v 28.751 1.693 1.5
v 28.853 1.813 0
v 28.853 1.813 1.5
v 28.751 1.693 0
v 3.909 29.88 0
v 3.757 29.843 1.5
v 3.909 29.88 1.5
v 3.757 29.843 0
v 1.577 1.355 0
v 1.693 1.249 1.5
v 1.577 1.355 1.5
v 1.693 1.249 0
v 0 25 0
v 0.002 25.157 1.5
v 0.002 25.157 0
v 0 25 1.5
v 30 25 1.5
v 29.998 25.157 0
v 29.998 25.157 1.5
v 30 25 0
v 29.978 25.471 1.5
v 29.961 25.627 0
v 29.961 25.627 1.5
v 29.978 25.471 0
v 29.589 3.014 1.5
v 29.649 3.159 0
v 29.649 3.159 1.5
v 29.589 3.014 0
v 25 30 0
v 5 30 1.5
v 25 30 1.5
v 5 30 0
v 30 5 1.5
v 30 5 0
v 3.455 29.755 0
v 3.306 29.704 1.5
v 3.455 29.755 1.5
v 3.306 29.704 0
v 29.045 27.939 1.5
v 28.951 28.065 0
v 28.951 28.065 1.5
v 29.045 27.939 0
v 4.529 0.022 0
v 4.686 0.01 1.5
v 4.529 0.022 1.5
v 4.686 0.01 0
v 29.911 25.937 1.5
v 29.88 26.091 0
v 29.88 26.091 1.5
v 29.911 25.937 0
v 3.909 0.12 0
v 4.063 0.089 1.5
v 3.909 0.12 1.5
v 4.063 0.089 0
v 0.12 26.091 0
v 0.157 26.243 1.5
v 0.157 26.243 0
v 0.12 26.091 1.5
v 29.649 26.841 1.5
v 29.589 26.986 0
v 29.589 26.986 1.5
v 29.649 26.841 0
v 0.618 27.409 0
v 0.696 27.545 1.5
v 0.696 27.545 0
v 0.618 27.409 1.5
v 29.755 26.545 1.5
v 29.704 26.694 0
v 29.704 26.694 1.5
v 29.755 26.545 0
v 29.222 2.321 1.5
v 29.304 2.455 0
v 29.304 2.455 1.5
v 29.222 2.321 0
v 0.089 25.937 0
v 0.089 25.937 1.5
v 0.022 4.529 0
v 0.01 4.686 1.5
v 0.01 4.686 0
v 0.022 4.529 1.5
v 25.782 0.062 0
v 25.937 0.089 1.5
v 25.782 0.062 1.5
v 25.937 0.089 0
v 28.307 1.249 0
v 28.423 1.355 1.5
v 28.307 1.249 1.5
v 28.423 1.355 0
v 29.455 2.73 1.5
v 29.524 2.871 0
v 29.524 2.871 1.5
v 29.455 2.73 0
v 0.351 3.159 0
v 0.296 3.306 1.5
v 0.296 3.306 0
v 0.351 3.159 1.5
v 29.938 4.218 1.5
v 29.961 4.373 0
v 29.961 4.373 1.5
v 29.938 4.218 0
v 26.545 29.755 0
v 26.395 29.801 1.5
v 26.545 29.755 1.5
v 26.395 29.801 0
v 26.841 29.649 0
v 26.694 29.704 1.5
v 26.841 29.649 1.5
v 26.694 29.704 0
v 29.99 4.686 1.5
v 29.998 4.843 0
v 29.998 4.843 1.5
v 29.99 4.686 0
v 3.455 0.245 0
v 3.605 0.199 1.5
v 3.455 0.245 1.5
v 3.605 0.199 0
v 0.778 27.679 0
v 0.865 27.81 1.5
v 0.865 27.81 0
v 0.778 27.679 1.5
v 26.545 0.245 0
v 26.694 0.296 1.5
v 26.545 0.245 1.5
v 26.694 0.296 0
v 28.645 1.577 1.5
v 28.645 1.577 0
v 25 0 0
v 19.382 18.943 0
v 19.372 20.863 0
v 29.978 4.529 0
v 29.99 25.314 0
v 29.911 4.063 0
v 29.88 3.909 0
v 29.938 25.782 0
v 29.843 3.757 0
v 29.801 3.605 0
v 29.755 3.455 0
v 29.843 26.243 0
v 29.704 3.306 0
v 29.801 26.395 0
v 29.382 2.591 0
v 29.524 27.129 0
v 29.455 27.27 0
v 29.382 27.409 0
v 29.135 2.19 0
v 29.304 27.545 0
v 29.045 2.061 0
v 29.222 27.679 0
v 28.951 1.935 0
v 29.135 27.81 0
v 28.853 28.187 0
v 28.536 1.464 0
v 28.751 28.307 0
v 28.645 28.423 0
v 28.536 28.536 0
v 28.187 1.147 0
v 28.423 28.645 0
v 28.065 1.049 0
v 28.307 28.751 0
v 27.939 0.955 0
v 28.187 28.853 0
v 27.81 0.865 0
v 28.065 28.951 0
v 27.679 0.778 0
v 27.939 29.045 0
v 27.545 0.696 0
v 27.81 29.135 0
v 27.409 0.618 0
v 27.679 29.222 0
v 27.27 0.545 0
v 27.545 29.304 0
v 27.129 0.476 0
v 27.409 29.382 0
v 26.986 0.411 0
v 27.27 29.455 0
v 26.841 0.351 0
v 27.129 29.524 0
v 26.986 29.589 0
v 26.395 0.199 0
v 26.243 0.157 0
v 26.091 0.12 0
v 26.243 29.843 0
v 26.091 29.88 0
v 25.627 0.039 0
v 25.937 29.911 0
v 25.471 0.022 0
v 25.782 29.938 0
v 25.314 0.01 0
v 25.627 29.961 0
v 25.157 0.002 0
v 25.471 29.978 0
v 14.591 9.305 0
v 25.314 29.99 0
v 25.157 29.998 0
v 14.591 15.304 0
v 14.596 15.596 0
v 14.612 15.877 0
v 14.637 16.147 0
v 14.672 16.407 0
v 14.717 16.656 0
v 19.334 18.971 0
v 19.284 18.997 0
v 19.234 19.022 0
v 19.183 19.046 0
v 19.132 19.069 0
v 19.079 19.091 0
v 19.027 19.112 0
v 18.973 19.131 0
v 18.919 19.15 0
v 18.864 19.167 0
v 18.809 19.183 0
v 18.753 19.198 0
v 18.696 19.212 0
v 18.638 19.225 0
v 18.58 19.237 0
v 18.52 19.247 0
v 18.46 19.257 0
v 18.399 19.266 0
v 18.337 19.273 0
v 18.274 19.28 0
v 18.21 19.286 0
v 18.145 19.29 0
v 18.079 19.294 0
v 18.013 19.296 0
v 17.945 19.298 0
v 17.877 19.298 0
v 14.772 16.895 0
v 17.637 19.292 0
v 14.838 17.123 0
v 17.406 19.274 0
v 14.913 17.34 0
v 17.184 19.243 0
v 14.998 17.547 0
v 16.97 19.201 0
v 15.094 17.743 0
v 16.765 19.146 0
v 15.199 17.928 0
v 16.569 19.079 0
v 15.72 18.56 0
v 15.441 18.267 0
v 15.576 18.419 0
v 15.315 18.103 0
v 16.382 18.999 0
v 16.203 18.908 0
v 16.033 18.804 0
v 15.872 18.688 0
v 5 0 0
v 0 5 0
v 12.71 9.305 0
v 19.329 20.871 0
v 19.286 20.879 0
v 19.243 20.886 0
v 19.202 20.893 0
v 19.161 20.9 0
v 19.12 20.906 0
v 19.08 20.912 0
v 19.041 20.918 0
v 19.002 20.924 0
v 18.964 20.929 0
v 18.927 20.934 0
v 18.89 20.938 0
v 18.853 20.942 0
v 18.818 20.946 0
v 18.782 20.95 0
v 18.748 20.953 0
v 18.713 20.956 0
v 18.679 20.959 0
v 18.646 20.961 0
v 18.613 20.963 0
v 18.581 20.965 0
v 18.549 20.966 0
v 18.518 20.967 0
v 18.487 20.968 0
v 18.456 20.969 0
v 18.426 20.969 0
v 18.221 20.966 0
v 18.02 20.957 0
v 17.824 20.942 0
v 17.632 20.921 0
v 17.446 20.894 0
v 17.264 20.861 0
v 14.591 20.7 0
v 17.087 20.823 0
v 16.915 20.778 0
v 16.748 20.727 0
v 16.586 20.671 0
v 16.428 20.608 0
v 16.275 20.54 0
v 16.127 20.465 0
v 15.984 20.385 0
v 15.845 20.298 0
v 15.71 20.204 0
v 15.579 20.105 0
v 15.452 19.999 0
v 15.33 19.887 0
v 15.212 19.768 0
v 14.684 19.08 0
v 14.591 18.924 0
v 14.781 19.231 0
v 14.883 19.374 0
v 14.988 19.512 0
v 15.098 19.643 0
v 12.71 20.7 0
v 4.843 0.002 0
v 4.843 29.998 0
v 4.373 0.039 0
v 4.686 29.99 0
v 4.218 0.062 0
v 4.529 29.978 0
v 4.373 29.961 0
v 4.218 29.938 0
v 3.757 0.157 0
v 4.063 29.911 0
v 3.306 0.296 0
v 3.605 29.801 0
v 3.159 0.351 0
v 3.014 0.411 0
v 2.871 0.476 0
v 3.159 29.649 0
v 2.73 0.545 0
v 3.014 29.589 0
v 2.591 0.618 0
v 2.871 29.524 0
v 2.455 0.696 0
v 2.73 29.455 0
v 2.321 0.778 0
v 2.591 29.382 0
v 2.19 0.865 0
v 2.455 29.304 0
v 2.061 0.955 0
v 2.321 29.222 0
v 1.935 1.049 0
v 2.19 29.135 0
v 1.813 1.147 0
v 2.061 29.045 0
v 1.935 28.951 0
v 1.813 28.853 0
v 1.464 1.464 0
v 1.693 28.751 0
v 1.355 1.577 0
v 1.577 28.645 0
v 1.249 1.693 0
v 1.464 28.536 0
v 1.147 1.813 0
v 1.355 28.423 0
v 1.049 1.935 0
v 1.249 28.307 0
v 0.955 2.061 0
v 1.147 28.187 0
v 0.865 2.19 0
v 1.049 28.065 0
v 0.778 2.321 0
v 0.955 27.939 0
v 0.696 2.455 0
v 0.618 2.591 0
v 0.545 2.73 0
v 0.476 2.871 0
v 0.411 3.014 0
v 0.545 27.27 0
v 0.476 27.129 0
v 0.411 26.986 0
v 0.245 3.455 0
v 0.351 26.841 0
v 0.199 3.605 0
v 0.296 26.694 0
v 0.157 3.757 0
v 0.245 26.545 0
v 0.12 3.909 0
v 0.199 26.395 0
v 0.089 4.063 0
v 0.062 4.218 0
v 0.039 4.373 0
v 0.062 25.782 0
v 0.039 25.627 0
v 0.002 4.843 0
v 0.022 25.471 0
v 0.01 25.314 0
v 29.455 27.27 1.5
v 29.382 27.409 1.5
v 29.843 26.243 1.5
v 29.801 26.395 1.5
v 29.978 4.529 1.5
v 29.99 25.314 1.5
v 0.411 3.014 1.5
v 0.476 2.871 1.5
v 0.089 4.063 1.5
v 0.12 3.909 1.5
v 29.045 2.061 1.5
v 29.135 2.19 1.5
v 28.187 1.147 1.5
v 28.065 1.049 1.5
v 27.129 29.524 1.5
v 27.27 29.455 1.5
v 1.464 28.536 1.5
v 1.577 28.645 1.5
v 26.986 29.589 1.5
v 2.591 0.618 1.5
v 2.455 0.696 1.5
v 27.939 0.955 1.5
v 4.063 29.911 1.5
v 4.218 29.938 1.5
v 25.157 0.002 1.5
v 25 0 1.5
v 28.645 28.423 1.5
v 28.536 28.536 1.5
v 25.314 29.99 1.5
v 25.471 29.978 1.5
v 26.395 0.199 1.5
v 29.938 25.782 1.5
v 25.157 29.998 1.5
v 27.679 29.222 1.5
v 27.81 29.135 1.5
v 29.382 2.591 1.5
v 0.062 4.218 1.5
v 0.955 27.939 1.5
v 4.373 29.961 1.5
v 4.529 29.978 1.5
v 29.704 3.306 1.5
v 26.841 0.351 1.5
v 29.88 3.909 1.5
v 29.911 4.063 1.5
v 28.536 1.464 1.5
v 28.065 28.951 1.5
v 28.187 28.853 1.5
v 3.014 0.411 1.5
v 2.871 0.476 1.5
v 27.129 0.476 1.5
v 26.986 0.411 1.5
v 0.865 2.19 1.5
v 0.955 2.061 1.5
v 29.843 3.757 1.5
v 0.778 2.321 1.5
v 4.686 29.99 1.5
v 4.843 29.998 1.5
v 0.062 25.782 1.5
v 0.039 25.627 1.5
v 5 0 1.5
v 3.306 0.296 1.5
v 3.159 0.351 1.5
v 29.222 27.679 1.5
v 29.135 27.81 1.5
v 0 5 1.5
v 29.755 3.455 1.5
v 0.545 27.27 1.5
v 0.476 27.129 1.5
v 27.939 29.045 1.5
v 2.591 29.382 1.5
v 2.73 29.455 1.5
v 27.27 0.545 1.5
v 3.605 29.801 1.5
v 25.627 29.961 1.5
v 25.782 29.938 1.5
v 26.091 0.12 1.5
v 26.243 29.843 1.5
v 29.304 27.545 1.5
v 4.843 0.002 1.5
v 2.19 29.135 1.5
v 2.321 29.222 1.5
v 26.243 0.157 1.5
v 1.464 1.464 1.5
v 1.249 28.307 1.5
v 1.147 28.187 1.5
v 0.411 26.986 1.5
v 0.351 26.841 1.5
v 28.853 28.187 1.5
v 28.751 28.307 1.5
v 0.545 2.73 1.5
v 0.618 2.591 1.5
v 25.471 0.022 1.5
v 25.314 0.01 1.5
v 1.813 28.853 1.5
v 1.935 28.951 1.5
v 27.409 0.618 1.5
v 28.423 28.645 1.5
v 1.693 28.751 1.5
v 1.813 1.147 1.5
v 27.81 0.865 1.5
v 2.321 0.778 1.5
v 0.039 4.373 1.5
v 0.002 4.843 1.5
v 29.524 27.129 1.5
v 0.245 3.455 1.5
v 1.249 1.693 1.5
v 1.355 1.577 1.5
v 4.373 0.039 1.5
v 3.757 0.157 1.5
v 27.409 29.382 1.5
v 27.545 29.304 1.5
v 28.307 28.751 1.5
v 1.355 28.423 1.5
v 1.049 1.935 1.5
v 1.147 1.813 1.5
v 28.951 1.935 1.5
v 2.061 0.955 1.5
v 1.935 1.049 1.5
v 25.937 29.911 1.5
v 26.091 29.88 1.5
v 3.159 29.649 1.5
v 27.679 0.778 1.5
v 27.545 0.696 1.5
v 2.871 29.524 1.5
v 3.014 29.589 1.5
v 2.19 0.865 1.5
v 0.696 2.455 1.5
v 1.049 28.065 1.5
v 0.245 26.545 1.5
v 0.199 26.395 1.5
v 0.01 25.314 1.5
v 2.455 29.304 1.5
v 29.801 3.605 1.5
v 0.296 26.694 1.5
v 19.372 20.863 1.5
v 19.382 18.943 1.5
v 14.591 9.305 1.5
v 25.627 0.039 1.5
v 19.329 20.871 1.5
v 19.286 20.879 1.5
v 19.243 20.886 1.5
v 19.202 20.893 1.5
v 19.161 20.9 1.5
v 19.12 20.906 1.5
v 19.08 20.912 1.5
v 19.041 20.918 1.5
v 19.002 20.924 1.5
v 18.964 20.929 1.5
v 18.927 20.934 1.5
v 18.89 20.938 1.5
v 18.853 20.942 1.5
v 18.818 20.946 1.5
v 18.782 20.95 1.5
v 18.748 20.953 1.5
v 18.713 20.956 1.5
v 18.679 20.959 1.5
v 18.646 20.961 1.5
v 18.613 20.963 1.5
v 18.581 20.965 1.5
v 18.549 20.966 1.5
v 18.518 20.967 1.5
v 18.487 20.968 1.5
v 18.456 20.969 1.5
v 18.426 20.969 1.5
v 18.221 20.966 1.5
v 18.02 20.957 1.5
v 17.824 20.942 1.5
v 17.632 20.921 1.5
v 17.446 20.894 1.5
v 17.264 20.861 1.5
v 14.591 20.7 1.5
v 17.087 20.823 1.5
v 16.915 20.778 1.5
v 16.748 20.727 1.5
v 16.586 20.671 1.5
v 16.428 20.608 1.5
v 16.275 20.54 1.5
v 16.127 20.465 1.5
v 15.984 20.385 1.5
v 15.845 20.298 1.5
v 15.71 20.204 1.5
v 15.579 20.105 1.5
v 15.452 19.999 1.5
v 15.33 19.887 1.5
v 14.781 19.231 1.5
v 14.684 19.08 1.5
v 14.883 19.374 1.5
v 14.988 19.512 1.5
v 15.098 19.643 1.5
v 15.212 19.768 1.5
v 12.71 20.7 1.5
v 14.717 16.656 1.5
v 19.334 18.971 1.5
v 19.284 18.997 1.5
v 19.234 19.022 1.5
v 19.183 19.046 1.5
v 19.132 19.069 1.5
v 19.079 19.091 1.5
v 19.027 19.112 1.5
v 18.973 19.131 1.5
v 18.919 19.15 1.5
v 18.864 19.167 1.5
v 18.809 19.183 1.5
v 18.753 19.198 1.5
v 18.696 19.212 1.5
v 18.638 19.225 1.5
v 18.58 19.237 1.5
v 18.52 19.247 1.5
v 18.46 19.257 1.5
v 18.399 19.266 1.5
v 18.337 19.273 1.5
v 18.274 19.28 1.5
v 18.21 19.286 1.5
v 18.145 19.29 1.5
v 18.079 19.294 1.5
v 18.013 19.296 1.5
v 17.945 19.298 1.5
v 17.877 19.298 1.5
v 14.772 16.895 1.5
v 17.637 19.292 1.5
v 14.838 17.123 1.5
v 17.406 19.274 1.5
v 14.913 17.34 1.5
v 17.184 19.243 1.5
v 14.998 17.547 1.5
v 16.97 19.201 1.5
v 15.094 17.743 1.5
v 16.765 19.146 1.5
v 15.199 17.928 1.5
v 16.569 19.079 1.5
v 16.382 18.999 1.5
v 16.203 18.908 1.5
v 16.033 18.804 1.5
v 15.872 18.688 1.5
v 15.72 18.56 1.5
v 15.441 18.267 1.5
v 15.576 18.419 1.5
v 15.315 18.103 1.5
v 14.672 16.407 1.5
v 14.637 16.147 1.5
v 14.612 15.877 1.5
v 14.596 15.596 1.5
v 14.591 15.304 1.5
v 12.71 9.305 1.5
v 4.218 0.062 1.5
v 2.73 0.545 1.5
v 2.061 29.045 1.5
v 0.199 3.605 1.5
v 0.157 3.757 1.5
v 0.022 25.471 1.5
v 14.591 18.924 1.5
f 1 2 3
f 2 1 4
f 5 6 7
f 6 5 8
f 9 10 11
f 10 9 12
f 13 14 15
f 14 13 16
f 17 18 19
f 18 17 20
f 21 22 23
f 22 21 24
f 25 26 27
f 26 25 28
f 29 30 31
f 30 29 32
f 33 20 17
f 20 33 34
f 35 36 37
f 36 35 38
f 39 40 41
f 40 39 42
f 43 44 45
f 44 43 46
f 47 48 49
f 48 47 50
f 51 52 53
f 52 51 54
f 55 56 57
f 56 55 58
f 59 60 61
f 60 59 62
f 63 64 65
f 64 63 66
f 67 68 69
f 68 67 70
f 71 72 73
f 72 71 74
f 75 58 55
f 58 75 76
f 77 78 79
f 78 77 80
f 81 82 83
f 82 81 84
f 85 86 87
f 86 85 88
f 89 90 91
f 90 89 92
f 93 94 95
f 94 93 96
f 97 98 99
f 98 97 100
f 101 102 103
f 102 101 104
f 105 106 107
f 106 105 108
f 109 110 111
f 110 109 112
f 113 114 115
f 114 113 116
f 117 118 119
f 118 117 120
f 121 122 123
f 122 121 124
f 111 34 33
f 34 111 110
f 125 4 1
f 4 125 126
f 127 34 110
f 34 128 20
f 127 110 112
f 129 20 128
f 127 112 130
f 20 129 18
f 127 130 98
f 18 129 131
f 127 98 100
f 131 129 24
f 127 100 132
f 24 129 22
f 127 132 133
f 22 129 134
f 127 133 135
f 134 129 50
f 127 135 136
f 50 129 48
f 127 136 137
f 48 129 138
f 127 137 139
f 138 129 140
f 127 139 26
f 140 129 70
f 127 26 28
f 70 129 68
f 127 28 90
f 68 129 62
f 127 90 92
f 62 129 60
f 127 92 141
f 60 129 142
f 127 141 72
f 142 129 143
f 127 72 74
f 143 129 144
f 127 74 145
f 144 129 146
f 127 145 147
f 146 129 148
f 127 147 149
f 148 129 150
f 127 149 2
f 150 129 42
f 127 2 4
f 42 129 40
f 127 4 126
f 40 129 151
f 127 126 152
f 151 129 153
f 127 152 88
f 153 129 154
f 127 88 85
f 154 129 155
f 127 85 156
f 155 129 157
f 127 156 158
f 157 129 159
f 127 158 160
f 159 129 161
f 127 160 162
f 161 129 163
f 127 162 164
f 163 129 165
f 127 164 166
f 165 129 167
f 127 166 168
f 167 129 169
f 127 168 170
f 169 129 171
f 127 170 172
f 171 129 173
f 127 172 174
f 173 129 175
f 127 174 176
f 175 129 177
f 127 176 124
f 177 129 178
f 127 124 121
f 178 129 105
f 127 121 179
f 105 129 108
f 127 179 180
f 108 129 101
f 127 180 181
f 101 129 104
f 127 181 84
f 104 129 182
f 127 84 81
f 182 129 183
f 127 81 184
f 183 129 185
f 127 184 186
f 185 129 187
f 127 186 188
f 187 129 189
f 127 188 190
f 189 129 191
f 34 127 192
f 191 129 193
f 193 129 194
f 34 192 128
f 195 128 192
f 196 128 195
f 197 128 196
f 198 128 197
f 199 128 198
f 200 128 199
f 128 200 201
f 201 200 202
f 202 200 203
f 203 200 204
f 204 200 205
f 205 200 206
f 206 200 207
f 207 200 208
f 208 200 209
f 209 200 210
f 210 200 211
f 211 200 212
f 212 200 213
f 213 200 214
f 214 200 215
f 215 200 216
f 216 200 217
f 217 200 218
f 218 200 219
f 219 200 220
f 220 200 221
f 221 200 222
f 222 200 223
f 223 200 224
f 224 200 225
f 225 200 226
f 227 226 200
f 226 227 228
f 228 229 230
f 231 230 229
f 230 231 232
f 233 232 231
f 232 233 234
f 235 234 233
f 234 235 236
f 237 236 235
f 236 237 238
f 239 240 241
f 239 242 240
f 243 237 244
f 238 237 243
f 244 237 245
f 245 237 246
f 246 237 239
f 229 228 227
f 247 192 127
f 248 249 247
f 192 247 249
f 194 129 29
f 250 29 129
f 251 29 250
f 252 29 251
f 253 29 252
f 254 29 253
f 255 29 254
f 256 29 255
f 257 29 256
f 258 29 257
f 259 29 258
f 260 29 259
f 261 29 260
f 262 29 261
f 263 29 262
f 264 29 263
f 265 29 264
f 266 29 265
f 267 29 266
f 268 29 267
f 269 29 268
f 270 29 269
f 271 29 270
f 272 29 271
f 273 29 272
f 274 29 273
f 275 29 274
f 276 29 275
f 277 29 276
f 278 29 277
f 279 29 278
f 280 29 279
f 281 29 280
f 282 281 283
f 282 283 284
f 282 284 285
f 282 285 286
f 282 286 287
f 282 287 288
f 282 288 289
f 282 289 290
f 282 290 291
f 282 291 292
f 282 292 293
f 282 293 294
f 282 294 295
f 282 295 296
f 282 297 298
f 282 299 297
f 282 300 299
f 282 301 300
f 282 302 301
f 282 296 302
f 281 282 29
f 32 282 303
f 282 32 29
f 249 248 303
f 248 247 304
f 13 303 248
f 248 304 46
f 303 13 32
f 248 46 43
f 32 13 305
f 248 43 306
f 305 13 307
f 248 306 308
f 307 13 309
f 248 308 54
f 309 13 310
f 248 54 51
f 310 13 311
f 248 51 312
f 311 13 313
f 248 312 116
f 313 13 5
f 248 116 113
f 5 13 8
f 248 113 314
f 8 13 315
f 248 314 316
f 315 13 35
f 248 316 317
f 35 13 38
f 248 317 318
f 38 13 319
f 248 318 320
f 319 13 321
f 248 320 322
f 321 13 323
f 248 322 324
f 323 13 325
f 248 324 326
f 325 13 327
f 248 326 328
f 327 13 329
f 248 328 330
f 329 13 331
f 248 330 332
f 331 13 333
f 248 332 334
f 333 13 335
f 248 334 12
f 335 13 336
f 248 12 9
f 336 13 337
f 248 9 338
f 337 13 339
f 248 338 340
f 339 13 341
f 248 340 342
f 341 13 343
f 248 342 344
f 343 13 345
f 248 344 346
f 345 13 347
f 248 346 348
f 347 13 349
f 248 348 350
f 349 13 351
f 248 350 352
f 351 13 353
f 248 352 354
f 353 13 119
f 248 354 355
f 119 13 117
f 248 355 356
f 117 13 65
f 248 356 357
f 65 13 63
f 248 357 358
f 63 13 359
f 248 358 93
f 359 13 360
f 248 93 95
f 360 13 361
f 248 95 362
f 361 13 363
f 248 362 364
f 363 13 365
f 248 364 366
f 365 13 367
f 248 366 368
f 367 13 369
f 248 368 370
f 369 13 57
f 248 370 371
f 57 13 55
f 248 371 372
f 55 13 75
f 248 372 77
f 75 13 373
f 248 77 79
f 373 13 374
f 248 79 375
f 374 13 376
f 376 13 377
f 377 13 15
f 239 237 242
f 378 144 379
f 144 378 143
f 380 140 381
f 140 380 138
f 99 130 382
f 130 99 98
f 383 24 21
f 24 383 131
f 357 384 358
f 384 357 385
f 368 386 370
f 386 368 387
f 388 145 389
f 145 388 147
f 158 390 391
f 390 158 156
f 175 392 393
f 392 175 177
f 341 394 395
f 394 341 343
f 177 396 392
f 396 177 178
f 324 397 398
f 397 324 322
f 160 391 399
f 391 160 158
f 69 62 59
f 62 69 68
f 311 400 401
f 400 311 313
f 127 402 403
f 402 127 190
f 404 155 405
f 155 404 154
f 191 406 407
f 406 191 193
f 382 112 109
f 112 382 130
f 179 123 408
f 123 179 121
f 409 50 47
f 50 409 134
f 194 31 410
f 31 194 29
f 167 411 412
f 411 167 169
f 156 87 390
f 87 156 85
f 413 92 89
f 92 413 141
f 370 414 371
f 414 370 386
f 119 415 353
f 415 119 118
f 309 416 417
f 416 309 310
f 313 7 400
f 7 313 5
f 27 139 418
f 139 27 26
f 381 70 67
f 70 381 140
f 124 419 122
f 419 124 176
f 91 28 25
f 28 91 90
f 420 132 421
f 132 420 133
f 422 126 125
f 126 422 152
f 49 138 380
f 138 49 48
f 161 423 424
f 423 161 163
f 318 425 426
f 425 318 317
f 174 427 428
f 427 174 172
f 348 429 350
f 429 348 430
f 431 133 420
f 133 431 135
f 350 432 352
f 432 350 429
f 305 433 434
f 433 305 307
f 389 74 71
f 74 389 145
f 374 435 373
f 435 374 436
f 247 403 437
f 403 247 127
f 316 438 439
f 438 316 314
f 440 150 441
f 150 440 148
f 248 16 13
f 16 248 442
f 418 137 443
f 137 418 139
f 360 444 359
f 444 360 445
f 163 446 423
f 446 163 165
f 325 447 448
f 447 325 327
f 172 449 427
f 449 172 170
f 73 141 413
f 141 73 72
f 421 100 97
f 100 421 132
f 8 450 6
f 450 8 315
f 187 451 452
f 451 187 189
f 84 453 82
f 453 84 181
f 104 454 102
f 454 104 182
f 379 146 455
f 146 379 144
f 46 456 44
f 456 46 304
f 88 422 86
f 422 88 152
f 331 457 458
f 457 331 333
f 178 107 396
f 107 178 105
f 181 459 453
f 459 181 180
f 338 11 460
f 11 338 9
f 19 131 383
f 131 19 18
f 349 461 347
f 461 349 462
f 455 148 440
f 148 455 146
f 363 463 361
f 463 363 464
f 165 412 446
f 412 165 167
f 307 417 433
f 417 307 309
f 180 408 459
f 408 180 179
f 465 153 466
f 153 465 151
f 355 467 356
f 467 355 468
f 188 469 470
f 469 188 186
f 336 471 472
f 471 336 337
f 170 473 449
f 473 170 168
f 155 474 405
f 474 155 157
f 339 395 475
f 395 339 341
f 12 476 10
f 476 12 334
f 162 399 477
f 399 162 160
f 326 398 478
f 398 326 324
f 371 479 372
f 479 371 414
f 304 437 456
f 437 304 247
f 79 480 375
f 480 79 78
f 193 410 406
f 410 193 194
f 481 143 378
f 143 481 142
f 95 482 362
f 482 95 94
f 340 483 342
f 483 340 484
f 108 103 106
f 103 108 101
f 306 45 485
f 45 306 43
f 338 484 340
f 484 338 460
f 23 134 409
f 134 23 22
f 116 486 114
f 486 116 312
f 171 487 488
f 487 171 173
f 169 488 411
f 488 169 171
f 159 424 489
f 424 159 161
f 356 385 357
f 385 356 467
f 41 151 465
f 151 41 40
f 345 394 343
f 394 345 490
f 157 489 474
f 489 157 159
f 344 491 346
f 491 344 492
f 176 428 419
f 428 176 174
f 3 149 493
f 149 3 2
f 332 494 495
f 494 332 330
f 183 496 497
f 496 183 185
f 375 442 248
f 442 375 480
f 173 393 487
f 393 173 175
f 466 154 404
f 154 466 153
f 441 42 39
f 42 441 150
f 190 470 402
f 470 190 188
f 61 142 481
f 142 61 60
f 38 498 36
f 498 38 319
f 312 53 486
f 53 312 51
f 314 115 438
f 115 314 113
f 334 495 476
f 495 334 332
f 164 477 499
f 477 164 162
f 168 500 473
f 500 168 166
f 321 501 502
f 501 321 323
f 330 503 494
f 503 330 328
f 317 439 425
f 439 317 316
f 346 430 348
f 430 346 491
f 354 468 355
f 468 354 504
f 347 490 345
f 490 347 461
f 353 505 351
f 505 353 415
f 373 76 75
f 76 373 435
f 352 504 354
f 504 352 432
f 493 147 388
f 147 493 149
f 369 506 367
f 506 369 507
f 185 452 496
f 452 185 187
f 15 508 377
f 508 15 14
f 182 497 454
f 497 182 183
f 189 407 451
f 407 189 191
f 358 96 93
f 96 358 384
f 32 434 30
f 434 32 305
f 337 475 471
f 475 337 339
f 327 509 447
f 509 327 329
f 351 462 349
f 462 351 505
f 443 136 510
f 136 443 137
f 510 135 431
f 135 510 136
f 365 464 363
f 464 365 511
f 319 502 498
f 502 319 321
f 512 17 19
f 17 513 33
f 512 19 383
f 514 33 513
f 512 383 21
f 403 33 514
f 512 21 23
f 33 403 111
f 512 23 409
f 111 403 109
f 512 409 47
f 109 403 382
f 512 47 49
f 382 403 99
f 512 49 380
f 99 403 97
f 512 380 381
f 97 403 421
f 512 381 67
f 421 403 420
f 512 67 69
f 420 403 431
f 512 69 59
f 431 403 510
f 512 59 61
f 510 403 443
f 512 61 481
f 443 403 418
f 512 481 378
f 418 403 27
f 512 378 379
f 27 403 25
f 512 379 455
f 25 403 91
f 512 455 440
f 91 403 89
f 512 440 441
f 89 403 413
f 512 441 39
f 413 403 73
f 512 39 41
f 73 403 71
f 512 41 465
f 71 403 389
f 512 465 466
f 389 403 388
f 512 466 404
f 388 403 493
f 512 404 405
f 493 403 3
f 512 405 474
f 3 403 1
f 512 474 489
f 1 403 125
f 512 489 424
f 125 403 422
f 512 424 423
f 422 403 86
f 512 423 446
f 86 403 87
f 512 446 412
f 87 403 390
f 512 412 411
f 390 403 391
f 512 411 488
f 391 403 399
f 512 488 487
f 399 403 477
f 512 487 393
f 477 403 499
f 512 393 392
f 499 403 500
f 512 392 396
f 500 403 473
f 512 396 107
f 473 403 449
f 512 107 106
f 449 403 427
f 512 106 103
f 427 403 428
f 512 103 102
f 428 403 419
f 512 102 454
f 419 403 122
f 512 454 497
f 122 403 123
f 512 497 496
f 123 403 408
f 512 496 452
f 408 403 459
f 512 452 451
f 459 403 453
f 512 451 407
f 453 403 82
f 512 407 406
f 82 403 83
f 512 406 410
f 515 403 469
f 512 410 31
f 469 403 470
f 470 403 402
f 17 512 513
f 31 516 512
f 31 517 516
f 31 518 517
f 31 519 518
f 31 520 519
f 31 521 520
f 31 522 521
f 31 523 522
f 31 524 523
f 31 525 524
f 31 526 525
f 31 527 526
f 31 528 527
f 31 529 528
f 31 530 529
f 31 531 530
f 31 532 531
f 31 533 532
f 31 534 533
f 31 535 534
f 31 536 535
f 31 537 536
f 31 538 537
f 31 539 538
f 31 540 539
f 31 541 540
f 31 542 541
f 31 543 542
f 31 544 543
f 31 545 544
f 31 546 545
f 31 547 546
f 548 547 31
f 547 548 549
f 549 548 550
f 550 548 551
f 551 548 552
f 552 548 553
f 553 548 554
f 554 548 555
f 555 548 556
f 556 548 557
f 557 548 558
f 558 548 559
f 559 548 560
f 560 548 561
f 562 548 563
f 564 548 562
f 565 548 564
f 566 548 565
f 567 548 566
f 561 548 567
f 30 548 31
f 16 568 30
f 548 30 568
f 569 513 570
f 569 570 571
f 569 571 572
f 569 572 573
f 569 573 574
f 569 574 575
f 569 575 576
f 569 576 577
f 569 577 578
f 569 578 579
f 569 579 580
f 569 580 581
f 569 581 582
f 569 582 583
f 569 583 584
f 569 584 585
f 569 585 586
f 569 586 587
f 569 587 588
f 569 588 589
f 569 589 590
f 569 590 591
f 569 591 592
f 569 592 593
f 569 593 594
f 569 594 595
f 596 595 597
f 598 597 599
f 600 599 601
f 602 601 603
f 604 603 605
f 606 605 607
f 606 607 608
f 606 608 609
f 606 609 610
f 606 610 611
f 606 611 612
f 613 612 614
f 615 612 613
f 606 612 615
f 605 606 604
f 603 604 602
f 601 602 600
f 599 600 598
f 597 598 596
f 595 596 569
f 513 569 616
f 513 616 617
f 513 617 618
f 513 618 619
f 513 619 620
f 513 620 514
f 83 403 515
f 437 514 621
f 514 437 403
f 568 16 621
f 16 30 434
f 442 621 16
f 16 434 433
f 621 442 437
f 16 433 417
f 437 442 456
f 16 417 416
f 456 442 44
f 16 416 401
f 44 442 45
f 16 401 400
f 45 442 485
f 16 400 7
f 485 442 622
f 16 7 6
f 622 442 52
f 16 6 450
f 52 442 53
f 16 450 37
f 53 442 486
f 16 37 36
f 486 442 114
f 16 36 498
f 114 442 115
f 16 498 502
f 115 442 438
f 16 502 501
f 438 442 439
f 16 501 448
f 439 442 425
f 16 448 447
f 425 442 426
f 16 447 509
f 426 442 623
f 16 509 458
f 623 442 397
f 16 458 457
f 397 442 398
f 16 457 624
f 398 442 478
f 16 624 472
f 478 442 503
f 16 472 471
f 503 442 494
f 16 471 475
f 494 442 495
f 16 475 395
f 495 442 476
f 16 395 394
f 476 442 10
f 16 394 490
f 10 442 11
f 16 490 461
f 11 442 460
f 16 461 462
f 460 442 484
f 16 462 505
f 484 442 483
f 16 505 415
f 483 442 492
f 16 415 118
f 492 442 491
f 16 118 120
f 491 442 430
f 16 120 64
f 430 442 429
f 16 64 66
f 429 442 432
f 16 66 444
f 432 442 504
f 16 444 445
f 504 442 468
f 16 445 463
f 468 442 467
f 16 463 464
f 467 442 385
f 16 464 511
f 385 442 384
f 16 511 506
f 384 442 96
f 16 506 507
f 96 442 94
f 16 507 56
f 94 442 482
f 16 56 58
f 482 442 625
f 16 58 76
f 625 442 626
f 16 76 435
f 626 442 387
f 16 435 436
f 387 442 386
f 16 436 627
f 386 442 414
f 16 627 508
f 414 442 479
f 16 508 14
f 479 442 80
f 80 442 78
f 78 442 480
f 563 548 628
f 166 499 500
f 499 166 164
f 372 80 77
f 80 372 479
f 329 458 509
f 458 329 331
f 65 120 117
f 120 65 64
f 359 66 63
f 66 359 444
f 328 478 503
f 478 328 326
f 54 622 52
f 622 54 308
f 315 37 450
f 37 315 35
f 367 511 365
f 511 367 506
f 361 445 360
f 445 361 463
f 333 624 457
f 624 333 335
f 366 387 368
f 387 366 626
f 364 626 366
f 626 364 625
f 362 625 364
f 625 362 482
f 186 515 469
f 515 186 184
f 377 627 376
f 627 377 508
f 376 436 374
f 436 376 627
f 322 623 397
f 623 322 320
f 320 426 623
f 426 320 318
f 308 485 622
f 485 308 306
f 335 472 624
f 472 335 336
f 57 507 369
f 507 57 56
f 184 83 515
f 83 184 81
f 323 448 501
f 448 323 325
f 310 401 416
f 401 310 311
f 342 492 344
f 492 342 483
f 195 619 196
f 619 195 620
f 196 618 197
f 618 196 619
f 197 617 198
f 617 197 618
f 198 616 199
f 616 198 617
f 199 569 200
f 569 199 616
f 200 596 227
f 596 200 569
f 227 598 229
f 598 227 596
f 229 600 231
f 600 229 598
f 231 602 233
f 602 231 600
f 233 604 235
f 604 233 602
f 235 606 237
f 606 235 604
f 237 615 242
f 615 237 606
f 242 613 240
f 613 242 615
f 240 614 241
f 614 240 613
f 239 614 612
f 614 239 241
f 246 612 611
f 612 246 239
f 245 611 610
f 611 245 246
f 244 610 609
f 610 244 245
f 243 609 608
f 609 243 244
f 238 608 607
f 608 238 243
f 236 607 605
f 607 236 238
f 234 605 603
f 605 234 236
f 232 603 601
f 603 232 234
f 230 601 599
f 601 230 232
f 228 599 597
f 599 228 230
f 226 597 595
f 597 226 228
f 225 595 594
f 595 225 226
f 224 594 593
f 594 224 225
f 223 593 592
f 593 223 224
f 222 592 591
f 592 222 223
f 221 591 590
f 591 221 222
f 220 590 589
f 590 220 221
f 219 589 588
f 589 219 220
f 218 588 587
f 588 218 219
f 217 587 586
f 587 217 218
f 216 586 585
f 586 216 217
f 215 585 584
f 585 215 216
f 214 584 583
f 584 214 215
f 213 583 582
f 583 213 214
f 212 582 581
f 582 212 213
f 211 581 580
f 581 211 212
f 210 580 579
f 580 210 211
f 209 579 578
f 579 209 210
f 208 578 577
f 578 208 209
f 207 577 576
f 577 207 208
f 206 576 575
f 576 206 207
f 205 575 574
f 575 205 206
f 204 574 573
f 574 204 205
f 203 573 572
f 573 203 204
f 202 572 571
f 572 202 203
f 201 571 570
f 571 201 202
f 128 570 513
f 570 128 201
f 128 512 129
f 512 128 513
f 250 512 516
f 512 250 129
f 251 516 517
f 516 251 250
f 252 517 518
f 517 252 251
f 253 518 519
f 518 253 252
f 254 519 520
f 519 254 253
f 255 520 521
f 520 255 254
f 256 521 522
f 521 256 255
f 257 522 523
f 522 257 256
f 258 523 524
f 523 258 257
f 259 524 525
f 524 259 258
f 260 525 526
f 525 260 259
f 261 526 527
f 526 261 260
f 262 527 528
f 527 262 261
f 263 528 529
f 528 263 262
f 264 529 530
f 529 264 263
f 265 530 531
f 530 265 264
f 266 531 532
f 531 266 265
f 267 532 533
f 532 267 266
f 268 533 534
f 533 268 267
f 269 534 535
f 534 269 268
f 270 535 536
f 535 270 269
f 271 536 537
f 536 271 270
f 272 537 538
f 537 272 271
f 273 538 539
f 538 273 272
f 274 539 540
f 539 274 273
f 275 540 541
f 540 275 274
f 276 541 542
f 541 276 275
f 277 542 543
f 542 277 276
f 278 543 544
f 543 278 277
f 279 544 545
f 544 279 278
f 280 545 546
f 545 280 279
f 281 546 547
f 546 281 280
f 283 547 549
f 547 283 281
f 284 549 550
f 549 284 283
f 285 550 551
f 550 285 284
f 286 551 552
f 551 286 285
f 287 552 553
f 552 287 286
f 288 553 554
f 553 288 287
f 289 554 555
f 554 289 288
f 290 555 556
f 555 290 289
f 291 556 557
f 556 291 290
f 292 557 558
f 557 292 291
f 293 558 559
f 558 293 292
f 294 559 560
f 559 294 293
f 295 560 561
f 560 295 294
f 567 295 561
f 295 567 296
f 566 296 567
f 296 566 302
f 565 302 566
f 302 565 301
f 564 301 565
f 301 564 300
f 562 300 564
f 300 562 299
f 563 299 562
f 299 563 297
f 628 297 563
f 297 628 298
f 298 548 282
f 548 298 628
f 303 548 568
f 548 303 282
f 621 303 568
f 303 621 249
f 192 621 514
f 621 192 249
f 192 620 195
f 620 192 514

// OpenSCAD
// Source taken from @arifshefi
//   https://www.myminifactory.com/object/3d-print-maple-leaf-57574
//

r = 5;
h = 2;
s = 20;

margin = r;

sp=s+2*margin;
FONT="Cirth Erebor";

module leaf() {
    difference() {
        translate([r,r,0])
        minkowski() {
            cube([sp-2*r,sp-2*r,h/2]);
            cylinder(h=h/4,r=r,$fn=200);
        }
        translate([s*3/4,s*3/4,0])
        linear_extrude(h) text("r", size=3*r, font=FONT,
            halign="center",valign="center",$fn=100);
    }
}

leaf();
